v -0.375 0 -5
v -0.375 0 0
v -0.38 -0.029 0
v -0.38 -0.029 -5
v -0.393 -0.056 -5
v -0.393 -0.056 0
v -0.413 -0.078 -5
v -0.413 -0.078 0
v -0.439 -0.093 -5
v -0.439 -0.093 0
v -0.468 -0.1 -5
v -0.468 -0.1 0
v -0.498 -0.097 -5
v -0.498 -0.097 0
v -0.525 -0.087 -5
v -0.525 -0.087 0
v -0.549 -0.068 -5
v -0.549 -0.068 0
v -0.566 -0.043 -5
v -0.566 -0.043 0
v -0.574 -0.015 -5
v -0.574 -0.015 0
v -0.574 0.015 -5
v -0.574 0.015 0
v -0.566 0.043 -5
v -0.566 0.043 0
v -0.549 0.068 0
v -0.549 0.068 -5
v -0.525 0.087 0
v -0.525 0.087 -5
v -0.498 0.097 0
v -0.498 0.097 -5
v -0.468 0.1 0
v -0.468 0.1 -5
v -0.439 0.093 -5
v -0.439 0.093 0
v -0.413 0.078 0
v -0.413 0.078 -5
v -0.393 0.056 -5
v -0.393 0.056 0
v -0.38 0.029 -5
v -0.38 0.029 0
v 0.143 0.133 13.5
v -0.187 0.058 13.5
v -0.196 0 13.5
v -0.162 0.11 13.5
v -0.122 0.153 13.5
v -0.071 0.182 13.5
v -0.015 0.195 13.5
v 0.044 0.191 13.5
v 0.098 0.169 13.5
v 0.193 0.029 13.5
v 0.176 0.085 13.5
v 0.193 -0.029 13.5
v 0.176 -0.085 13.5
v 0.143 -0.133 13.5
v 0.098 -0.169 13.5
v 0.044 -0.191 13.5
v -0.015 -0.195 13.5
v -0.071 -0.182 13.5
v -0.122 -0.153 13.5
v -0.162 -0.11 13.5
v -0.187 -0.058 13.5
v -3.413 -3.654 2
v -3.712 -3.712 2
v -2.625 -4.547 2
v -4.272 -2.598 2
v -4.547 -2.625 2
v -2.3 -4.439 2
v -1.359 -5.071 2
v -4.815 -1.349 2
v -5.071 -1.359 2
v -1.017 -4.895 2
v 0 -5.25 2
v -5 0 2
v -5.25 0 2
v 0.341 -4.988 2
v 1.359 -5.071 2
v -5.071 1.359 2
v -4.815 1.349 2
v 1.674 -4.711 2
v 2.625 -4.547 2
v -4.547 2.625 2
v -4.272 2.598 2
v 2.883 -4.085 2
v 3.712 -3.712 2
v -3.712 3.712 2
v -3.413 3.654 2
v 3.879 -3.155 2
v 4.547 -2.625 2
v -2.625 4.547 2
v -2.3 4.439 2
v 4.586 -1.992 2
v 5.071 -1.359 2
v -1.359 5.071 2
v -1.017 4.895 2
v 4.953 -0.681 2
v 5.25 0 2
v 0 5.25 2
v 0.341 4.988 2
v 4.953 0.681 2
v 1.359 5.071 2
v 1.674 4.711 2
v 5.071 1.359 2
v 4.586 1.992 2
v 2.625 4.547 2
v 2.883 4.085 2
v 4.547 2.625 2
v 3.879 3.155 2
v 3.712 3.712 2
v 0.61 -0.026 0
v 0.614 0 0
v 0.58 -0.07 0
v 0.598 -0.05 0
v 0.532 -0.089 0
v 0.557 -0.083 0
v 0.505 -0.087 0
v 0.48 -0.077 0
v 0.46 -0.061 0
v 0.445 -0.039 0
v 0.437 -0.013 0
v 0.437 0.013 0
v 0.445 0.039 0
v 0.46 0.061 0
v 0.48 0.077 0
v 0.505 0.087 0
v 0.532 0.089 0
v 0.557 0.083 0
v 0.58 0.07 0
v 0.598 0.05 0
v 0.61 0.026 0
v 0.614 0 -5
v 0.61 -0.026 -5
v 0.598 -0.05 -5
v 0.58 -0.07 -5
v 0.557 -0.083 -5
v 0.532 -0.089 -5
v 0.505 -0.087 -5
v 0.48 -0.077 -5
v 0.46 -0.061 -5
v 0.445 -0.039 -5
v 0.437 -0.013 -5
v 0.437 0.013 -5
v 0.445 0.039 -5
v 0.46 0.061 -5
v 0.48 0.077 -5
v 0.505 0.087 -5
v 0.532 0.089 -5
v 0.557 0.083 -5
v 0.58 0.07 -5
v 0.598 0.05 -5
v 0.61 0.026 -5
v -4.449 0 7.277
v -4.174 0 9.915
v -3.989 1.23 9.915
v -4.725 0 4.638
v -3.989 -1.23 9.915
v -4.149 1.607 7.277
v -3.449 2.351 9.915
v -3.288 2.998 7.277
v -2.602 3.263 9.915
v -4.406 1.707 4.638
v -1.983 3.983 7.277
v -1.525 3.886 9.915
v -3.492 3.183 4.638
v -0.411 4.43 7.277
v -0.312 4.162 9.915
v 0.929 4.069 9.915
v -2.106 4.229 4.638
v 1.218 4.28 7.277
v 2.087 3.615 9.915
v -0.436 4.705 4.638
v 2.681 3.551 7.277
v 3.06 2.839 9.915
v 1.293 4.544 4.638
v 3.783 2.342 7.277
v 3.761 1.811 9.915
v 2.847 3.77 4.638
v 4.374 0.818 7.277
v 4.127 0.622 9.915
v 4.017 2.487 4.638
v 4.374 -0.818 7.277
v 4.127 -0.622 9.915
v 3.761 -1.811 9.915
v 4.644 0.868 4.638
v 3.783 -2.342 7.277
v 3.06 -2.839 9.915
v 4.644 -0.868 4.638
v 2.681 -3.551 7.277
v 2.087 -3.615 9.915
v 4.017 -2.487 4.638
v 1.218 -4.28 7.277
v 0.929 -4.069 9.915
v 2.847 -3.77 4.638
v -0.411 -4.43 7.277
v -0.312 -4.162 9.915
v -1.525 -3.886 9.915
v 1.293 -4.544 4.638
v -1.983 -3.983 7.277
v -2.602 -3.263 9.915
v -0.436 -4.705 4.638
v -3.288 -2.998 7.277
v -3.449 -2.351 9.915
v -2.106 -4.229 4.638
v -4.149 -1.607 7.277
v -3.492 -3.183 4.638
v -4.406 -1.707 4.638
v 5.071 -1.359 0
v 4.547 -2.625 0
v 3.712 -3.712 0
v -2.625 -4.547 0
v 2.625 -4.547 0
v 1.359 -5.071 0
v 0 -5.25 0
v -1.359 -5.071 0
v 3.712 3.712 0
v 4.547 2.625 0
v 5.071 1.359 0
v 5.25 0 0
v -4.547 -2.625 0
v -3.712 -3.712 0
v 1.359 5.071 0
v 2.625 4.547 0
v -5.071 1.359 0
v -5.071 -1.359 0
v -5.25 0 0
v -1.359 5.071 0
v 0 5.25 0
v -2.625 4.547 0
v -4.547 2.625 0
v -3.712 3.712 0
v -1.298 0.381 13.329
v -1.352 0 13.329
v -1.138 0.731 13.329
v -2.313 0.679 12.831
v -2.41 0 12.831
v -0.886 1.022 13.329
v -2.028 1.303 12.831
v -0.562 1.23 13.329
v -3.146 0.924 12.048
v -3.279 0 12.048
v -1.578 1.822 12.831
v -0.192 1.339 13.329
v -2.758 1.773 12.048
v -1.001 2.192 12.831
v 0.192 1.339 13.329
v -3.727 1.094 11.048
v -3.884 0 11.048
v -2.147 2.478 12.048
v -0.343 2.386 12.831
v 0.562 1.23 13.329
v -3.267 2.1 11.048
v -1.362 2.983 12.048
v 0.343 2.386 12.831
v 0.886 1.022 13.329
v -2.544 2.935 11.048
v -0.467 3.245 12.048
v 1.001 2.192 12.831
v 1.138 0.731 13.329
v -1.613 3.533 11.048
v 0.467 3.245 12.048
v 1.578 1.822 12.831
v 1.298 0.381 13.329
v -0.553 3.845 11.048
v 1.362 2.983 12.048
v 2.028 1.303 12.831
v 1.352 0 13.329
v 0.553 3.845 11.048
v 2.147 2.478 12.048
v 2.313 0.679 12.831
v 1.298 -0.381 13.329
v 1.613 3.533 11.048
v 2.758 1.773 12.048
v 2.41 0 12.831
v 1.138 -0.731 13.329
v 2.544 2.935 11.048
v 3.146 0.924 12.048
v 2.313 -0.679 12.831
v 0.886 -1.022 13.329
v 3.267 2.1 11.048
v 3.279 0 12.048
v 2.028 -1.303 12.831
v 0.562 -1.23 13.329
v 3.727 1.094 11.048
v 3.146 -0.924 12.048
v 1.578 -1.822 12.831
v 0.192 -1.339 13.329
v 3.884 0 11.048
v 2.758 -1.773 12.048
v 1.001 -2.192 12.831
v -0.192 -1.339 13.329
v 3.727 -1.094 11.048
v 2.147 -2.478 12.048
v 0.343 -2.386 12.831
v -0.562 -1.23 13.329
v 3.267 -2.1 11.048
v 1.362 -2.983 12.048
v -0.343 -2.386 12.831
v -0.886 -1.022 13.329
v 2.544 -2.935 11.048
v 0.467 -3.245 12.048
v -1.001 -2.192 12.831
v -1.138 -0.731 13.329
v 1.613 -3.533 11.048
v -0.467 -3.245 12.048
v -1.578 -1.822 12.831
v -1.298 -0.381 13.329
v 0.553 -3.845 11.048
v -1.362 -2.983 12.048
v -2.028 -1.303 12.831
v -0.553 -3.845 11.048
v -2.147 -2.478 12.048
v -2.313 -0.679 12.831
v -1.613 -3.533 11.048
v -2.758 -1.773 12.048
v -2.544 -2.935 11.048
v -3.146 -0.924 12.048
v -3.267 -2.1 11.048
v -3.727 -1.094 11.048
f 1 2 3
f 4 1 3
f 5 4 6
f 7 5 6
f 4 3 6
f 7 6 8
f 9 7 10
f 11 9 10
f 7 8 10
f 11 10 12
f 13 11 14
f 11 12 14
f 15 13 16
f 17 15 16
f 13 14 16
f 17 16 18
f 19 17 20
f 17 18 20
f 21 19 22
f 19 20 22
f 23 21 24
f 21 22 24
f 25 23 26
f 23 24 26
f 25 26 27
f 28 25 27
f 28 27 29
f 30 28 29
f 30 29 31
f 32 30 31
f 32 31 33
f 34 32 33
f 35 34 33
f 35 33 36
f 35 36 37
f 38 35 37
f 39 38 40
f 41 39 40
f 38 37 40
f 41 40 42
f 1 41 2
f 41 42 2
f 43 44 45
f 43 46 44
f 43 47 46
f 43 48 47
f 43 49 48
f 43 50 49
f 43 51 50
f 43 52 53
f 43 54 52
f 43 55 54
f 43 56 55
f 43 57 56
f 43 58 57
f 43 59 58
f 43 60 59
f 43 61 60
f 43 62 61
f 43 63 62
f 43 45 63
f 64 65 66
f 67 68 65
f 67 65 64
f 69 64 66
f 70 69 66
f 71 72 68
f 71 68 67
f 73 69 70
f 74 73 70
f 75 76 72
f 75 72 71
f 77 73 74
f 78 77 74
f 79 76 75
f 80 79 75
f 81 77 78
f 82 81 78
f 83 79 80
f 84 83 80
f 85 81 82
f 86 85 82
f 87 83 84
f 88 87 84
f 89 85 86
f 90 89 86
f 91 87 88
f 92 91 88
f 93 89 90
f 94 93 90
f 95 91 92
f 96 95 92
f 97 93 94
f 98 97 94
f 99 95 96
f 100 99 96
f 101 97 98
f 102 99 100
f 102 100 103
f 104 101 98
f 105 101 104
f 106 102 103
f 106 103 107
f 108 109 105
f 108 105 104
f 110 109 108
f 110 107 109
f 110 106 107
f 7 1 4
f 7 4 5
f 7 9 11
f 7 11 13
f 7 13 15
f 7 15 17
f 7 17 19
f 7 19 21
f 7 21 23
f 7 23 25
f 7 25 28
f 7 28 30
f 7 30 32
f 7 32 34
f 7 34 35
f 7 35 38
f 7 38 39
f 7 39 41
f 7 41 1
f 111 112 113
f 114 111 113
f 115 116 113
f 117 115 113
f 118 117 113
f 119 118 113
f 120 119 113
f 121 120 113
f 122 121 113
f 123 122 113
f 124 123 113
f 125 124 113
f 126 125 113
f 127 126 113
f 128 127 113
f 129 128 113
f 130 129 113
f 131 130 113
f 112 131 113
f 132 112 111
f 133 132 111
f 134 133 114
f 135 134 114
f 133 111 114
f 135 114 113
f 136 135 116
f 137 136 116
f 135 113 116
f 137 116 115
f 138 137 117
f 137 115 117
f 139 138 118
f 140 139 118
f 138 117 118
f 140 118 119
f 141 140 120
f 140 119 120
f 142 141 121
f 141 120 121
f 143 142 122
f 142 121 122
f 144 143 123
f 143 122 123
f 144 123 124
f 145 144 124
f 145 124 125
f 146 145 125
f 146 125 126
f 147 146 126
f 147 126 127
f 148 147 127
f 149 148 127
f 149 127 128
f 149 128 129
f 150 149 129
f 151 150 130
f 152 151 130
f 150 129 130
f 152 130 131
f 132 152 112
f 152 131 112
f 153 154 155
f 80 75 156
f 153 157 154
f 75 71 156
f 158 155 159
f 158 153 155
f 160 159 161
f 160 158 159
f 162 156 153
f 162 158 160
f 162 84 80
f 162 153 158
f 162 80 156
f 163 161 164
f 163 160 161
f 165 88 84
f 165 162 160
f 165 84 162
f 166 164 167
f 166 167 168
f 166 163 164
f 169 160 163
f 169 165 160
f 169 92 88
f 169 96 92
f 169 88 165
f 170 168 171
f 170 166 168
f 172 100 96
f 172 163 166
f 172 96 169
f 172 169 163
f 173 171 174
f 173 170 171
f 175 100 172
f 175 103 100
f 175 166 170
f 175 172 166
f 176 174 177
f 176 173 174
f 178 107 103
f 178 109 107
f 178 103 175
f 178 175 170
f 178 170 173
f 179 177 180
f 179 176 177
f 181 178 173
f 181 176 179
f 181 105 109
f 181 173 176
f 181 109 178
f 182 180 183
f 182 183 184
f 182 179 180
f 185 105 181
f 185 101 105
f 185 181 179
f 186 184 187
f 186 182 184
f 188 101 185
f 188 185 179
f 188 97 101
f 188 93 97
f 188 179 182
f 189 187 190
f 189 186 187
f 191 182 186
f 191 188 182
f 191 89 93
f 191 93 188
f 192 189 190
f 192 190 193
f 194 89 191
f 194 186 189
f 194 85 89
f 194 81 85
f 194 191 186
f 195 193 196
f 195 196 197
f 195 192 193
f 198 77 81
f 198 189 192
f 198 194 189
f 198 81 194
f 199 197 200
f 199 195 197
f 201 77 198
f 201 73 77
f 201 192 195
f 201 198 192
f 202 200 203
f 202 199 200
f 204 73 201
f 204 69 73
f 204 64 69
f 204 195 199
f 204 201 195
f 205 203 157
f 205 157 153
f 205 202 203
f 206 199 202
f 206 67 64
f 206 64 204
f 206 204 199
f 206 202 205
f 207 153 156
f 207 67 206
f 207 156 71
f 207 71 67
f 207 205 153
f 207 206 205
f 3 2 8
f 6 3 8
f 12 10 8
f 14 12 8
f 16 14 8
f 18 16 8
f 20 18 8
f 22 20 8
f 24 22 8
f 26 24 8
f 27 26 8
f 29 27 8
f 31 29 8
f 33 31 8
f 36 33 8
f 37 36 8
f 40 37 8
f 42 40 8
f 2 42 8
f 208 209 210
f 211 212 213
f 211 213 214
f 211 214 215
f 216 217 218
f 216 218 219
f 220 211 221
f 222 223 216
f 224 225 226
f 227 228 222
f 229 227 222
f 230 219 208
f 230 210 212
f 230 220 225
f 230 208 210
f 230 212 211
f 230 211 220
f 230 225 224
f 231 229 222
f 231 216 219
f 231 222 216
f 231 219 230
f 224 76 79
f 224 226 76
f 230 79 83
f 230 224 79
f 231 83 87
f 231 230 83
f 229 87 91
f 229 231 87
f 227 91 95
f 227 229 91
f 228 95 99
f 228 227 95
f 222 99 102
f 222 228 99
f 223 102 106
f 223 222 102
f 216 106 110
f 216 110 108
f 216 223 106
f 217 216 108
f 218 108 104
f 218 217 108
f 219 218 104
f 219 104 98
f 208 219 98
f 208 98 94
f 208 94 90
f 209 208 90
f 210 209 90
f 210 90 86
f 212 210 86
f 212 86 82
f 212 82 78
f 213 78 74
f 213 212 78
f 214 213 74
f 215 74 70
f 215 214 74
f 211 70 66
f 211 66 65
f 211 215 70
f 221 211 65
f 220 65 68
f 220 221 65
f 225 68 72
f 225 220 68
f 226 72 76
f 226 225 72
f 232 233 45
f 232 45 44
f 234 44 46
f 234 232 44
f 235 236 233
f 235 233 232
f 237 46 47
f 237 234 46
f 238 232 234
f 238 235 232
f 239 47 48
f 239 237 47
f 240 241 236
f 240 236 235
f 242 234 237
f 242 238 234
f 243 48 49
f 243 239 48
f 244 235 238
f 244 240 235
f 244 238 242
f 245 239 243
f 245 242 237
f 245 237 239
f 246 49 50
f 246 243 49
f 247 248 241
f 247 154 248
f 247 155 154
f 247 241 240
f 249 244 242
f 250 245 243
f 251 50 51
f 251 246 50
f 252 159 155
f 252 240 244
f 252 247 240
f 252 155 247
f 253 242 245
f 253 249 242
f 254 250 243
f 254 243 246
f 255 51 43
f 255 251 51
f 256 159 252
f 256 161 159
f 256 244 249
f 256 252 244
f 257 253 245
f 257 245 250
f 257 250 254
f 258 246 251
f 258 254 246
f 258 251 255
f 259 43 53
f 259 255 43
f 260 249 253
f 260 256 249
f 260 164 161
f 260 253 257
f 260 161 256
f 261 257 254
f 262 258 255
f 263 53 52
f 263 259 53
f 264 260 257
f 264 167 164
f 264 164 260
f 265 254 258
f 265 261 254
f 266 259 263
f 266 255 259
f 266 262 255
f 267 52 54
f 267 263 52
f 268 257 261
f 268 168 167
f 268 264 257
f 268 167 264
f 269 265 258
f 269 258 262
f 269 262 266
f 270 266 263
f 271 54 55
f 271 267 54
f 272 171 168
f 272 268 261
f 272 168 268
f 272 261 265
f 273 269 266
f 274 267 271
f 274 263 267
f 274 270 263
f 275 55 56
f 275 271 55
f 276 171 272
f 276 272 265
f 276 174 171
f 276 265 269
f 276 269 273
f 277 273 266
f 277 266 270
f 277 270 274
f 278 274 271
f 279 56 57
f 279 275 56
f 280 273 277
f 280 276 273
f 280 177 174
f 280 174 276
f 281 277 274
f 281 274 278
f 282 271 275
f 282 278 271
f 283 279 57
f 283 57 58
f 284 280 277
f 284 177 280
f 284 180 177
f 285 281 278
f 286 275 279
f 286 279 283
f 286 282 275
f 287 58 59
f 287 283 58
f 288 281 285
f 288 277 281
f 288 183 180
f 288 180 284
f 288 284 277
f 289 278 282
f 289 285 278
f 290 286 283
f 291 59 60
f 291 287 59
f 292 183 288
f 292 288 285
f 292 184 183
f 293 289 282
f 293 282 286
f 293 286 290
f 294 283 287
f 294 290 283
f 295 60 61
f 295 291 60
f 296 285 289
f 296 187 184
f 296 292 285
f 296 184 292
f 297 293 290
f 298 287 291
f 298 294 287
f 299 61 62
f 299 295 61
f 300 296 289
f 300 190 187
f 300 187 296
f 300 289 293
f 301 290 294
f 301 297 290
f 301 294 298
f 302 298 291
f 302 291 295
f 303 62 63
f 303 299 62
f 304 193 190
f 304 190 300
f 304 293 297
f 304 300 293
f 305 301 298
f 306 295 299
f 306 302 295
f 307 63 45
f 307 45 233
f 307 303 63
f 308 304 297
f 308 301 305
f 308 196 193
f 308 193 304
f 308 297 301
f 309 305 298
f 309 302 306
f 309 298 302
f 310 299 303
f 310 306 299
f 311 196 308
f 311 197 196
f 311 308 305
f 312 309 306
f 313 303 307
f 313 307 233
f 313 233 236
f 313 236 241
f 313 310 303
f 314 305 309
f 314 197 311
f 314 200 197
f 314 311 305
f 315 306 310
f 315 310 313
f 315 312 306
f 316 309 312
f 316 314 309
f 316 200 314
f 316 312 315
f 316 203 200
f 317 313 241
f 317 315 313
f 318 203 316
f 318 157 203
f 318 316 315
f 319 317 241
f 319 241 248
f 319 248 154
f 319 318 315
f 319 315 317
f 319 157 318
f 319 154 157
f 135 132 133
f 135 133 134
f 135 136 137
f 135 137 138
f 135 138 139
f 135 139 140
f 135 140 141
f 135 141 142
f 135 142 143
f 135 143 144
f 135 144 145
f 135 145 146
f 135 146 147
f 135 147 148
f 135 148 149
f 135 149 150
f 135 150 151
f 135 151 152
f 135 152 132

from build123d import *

# Parameters (mm, degrees)
F2_R     = 4
F3_R     = 0.1
F3_R_2   = 0.089102
F4_DEPTH = 5


with BuildPart() as f1:
    # F0 (on Front) → F1 (revolve)
    with BuildSketch(Plane.XZ):
        Polygon((-5.25, 2), (-5.25, 0), (0, 0), (0, 13.5), (-3.8, 13.5), (-5, 2), align=None)
    revolve(axis=Axis((0, 0, 6.75), (0, 0, -1)))

    # F2
    f2_edges = [f1.edges().sort_by_distance(p)[0] for p in [
        (3.8, 0, 13.5),
    ]]
    fillet(f2_edges, radius=F2_R)


with BuildPart() as f4:
    # F3 (on face) → F4 (new body)
    with BuildSketch(Plane(origin=(0, 0, 0), x_dir=(1, 0, 0), z_dir=(0, 0, -1))):
        with Locations((-0.47543, 0)):
            Circle(F3_R)
        with Locations((0.524872, 0)):
            Circle(F3_R_2)
    extrude(amount=F4_DEPTH)


solid = Compound([f1.part, f4.part])
